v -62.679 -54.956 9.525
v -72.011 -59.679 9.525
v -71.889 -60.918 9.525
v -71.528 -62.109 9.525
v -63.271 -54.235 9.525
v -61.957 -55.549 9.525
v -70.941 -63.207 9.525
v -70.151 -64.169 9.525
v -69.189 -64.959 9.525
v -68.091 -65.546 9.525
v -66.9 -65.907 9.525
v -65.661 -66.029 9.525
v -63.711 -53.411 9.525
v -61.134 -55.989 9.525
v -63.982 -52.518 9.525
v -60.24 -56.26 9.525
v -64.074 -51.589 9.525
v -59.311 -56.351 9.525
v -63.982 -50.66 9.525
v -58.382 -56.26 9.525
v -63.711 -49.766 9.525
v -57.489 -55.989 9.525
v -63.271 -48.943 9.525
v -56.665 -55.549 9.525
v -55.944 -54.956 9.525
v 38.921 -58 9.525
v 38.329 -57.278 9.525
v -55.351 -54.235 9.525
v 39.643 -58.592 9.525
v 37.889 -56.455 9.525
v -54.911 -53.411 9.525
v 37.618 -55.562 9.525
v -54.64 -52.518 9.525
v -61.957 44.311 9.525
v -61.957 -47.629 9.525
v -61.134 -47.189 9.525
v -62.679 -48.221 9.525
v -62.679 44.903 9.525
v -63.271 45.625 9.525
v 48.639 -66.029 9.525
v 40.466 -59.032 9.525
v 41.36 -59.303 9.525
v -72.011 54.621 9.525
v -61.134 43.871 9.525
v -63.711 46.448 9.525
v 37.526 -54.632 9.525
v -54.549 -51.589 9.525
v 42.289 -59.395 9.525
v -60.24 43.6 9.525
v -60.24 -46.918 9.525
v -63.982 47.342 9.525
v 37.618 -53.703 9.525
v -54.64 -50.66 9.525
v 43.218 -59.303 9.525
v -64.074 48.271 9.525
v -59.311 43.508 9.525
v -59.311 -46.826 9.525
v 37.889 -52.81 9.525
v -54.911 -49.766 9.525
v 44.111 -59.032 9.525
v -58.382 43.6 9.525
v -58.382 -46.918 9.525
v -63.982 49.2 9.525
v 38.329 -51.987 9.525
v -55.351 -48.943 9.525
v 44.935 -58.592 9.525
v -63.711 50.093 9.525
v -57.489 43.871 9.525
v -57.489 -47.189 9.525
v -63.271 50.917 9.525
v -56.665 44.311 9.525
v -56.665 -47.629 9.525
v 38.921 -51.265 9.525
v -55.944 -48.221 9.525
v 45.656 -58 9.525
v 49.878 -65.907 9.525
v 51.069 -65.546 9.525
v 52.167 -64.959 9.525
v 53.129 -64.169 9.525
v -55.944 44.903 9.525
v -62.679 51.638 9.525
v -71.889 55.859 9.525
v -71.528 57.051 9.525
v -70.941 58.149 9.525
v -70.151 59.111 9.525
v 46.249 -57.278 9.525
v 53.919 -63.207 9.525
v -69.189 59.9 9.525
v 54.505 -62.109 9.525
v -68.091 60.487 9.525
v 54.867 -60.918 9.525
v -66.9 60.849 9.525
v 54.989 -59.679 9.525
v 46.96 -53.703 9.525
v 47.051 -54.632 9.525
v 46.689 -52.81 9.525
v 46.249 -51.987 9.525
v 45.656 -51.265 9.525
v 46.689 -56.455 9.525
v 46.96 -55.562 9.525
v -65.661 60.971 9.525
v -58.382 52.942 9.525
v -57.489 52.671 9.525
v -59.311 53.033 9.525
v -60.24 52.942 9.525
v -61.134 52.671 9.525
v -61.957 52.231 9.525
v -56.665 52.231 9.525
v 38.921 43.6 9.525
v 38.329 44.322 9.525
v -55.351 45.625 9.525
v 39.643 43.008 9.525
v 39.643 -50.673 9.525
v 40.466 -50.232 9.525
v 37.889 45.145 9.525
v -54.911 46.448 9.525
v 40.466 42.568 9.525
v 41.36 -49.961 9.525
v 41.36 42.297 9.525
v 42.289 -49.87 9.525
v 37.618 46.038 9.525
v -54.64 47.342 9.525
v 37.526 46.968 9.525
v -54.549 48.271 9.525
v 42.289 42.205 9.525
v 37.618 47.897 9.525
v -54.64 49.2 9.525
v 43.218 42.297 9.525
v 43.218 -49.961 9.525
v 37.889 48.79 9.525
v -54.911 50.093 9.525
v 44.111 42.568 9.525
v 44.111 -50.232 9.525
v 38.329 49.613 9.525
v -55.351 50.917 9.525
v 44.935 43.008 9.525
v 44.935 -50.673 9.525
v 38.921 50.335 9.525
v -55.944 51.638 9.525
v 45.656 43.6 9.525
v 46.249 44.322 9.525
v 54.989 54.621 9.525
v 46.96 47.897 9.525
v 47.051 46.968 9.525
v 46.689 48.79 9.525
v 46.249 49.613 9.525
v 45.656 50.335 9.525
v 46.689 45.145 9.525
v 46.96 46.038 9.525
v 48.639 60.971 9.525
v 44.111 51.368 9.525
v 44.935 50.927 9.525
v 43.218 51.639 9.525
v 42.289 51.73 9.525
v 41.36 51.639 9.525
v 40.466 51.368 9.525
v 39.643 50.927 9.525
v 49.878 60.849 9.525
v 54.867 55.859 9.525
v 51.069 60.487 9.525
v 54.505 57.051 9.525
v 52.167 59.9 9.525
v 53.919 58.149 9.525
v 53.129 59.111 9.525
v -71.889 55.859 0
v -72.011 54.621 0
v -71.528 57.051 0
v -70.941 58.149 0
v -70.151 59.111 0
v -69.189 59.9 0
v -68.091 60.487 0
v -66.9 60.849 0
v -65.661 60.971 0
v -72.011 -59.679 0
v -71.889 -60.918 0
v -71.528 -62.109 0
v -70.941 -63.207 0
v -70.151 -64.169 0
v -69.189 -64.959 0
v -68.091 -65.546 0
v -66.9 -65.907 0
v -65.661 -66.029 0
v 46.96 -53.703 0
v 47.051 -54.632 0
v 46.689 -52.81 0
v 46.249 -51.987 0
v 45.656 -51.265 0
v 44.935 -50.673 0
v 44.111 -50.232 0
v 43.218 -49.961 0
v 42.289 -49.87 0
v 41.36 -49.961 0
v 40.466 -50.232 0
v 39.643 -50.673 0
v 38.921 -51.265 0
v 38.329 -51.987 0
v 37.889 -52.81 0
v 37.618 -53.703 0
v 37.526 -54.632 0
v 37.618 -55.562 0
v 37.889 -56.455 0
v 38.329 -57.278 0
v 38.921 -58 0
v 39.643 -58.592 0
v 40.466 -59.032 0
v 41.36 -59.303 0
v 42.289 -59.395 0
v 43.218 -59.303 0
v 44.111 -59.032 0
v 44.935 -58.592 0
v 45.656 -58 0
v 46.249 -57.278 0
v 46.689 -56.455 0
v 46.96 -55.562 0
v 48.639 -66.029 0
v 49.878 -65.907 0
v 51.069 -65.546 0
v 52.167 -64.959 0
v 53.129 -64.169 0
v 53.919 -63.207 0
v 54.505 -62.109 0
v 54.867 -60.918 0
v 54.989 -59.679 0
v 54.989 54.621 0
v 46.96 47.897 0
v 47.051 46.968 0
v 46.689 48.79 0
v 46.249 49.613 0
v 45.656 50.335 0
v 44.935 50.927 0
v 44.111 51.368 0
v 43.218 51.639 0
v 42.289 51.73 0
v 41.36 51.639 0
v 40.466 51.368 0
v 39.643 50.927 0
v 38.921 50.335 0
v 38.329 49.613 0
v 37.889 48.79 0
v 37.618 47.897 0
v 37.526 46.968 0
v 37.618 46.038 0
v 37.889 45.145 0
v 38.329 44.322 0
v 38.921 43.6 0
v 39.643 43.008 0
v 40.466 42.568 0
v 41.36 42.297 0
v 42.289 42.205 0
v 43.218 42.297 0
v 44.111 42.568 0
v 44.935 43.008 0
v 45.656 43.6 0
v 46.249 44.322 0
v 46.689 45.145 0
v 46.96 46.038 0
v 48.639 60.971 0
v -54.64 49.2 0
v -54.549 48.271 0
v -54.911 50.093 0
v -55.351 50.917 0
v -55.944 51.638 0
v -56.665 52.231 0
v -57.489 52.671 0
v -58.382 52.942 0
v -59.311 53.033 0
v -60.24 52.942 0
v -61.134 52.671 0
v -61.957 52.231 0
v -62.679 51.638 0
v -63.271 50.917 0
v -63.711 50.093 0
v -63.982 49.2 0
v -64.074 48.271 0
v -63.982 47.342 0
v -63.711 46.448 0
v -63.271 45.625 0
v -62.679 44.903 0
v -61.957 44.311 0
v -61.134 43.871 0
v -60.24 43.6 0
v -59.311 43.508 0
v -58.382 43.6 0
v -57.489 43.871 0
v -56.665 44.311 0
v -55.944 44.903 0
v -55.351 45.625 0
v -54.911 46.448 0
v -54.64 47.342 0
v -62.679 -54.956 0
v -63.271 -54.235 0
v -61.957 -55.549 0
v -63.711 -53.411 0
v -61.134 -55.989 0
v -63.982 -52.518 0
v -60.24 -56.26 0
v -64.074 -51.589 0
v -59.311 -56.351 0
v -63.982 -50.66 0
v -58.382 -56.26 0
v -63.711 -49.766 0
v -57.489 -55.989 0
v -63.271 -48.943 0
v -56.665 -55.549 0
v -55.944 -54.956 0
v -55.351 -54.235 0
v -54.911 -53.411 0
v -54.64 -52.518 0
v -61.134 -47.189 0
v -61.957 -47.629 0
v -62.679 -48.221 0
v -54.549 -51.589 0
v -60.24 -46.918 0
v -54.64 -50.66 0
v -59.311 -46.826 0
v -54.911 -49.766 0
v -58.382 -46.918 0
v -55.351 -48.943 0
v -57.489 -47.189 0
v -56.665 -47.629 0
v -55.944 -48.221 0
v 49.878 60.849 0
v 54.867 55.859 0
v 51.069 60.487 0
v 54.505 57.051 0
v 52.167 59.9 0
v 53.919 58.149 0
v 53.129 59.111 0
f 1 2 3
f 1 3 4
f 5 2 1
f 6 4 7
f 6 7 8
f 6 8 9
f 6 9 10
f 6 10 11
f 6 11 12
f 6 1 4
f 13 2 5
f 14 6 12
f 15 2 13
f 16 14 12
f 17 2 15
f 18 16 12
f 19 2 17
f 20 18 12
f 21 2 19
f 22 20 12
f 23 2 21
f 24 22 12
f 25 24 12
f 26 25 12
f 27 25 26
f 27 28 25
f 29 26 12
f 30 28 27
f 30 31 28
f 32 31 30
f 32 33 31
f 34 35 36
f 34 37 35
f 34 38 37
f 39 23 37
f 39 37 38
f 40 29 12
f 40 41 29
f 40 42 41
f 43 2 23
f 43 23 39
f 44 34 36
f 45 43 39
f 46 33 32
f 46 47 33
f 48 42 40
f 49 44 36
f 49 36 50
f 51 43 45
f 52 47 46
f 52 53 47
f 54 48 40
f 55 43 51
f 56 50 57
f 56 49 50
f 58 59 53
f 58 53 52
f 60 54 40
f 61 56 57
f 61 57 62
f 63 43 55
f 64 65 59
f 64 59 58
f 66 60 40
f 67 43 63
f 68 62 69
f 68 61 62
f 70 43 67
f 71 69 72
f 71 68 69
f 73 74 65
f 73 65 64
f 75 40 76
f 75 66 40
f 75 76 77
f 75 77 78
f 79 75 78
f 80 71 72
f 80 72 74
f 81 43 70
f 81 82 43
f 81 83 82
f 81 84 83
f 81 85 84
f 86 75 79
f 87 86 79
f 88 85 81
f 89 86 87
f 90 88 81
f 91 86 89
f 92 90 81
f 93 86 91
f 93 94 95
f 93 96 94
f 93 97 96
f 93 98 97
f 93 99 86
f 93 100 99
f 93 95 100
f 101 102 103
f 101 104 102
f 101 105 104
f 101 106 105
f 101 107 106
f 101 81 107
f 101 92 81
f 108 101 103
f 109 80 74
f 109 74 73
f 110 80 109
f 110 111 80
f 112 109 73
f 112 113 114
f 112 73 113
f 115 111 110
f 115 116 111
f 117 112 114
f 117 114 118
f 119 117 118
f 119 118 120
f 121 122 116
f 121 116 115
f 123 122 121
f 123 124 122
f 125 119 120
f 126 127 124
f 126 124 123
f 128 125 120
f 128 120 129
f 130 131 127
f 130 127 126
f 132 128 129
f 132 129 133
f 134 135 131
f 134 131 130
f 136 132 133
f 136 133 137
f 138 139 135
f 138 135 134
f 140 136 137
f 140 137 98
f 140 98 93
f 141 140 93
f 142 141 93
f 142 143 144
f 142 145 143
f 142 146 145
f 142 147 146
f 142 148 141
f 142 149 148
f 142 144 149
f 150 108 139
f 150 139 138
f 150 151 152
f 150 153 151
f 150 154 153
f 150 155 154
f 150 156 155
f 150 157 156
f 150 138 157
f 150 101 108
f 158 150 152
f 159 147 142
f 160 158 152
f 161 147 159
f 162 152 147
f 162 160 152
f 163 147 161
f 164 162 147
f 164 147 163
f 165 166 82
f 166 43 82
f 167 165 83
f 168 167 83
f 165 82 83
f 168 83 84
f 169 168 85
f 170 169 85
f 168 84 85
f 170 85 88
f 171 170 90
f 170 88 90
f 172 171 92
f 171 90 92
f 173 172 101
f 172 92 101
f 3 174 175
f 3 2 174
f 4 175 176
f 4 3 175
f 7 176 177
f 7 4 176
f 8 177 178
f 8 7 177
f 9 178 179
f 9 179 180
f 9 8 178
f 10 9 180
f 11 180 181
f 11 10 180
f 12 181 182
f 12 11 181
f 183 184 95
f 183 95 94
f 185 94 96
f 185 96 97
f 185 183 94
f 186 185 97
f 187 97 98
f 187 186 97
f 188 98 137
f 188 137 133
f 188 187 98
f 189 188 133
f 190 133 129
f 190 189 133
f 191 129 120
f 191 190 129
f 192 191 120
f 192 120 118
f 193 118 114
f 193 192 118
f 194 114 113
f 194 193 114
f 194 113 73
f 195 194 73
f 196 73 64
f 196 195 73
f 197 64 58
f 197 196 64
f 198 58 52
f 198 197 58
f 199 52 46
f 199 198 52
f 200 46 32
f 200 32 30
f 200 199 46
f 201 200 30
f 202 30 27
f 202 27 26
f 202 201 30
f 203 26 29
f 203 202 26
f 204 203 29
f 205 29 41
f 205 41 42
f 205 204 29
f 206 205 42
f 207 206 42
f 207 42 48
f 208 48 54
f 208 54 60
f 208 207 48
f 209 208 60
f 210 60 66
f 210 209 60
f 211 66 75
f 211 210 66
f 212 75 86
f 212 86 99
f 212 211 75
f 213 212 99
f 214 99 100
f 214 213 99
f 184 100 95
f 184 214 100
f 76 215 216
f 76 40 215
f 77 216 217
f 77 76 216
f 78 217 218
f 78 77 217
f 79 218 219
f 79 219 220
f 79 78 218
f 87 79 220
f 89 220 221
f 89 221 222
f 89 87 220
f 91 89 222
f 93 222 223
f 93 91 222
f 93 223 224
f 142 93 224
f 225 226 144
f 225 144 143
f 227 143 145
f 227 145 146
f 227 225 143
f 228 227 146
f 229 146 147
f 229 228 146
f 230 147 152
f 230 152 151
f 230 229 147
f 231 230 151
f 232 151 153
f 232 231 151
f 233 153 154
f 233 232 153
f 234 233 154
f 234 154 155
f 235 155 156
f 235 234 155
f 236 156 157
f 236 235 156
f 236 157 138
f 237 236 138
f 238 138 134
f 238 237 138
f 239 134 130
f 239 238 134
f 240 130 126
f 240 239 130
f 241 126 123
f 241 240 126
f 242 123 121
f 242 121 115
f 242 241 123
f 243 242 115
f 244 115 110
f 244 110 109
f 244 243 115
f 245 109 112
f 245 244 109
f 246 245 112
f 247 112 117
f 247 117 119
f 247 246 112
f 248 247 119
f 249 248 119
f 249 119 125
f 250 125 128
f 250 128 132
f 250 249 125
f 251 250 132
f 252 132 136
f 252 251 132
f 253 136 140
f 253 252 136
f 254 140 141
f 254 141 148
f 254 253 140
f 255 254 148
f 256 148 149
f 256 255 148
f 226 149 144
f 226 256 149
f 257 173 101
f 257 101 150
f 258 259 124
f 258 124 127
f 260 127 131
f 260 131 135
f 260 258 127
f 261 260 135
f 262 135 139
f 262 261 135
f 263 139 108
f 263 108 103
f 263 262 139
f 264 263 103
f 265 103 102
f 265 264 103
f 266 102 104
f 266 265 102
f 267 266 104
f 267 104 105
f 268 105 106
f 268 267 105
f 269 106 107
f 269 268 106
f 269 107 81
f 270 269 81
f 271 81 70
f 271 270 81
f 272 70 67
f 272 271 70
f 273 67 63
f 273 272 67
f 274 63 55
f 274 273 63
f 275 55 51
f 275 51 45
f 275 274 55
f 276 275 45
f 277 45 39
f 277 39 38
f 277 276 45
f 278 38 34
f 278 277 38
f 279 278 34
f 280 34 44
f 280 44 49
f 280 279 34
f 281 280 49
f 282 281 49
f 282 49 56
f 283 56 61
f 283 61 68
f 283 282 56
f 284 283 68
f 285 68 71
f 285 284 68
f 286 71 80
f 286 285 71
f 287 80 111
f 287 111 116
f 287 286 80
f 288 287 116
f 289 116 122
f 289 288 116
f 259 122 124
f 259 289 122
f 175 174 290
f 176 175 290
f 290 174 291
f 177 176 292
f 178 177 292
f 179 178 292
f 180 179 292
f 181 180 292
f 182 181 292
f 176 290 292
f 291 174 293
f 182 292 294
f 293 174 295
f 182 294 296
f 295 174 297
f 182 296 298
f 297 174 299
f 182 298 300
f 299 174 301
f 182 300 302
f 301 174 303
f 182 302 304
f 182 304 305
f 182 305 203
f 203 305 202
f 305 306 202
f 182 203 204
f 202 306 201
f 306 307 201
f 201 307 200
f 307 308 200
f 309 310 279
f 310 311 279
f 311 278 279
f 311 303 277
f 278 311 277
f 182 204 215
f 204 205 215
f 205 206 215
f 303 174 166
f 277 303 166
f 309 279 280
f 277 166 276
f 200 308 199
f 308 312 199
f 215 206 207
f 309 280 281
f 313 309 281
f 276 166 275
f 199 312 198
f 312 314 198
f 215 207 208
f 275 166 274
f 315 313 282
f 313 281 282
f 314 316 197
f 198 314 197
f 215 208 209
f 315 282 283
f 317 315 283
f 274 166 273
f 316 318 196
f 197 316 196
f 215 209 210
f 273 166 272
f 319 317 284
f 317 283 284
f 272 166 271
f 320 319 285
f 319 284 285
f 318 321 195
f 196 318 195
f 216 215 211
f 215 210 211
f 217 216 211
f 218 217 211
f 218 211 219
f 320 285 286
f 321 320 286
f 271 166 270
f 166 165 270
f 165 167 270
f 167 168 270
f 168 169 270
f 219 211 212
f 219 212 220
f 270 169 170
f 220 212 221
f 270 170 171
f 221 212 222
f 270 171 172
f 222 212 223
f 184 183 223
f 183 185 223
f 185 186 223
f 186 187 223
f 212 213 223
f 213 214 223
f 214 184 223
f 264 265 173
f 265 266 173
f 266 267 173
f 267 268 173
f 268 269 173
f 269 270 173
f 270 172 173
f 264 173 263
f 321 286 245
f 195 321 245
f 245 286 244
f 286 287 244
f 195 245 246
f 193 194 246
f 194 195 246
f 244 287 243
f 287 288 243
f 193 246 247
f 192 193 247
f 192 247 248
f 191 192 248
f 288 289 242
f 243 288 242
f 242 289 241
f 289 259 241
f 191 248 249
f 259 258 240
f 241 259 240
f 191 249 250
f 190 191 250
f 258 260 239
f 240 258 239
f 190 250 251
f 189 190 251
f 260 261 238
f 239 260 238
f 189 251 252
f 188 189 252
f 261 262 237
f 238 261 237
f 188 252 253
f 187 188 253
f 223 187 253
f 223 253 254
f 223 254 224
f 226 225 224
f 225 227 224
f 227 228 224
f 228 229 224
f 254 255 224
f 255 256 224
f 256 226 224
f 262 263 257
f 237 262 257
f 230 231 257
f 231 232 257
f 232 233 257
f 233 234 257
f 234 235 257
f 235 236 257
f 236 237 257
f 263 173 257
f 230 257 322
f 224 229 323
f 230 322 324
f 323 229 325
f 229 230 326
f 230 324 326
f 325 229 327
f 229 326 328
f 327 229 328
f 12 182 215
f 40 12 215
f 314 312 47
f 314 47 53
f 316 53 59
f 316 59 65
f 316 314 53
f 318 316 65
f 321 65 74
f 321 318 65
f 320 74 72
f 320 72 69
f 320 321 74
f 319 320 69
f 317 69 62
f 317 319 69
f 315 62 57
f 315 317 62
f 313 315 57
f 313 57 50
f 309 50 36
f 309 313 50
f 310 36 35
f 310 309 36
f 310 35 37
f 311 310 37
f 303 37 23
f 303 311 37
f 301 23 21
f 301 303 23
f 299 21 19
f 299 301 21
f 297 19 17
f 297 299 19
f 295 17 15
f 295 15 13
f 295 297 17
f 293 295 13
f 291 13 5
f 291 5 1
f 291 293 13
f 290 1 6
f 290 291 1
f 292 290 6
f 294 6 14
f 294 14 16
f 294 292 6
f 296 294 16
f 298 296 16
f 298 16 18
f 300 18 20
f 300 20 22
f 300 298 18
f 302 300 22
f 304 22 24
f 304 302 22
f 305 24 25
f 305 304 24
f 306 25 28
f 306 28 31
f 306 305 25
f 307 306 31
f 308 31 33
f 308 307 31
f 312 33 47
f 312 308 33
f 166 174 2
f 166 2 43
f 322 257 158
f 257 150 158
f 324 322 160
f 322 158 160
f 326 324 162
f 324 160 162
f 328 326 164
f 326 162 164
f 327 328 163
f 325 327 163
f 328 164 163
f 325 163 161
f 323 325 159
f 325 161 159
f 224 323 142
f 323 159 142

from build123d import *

# Parameters (mm, degrees)
F0_W     = 127
F0_H     = 127
F0_R     = 4.7625
F1_DEPTH = 9.525
F2_R     = 6.35


with BuildPart() as f1:
    # F0 (on Top) → F1 (new body)
    with BuildSketch(Plane.XY):
        with Locations((-8.511175, -2.529345)):
            Rectangle(F0_W, F0_H)
        with Locations((-59.311175, -51.588815)):
            Circle(F0_R, mode=Mode.SUBTRACT)
        with Locations((42.288825, -54.632434)):
            Circle(F0_R, mode=Mode.SUBTRACT)
        with Locations((-59.311175, 48.270655)):
            Circle(F0_R, mode=Mode.SUBTRACT)
        with Locations((42.288825, 46.967566)):
            Circle(F0_R, mode=Mode.SUBTRACT)
    extrude(amount=F1_DEPTH)

    # F2
    f2_edges = [f1.edges().sort_by_distance(p)[0] for p in [
        (-72.011175, -66.029345, 4.7625),
        (54.988825, -66.029345, 4.7625),
        (-72.011175, 60.970655, 4.7625),
        (54.988825, 60.970655, 4.7625),
    ]]
    fillet(f2_edges, radius=F2_R)


solid = f1.part
